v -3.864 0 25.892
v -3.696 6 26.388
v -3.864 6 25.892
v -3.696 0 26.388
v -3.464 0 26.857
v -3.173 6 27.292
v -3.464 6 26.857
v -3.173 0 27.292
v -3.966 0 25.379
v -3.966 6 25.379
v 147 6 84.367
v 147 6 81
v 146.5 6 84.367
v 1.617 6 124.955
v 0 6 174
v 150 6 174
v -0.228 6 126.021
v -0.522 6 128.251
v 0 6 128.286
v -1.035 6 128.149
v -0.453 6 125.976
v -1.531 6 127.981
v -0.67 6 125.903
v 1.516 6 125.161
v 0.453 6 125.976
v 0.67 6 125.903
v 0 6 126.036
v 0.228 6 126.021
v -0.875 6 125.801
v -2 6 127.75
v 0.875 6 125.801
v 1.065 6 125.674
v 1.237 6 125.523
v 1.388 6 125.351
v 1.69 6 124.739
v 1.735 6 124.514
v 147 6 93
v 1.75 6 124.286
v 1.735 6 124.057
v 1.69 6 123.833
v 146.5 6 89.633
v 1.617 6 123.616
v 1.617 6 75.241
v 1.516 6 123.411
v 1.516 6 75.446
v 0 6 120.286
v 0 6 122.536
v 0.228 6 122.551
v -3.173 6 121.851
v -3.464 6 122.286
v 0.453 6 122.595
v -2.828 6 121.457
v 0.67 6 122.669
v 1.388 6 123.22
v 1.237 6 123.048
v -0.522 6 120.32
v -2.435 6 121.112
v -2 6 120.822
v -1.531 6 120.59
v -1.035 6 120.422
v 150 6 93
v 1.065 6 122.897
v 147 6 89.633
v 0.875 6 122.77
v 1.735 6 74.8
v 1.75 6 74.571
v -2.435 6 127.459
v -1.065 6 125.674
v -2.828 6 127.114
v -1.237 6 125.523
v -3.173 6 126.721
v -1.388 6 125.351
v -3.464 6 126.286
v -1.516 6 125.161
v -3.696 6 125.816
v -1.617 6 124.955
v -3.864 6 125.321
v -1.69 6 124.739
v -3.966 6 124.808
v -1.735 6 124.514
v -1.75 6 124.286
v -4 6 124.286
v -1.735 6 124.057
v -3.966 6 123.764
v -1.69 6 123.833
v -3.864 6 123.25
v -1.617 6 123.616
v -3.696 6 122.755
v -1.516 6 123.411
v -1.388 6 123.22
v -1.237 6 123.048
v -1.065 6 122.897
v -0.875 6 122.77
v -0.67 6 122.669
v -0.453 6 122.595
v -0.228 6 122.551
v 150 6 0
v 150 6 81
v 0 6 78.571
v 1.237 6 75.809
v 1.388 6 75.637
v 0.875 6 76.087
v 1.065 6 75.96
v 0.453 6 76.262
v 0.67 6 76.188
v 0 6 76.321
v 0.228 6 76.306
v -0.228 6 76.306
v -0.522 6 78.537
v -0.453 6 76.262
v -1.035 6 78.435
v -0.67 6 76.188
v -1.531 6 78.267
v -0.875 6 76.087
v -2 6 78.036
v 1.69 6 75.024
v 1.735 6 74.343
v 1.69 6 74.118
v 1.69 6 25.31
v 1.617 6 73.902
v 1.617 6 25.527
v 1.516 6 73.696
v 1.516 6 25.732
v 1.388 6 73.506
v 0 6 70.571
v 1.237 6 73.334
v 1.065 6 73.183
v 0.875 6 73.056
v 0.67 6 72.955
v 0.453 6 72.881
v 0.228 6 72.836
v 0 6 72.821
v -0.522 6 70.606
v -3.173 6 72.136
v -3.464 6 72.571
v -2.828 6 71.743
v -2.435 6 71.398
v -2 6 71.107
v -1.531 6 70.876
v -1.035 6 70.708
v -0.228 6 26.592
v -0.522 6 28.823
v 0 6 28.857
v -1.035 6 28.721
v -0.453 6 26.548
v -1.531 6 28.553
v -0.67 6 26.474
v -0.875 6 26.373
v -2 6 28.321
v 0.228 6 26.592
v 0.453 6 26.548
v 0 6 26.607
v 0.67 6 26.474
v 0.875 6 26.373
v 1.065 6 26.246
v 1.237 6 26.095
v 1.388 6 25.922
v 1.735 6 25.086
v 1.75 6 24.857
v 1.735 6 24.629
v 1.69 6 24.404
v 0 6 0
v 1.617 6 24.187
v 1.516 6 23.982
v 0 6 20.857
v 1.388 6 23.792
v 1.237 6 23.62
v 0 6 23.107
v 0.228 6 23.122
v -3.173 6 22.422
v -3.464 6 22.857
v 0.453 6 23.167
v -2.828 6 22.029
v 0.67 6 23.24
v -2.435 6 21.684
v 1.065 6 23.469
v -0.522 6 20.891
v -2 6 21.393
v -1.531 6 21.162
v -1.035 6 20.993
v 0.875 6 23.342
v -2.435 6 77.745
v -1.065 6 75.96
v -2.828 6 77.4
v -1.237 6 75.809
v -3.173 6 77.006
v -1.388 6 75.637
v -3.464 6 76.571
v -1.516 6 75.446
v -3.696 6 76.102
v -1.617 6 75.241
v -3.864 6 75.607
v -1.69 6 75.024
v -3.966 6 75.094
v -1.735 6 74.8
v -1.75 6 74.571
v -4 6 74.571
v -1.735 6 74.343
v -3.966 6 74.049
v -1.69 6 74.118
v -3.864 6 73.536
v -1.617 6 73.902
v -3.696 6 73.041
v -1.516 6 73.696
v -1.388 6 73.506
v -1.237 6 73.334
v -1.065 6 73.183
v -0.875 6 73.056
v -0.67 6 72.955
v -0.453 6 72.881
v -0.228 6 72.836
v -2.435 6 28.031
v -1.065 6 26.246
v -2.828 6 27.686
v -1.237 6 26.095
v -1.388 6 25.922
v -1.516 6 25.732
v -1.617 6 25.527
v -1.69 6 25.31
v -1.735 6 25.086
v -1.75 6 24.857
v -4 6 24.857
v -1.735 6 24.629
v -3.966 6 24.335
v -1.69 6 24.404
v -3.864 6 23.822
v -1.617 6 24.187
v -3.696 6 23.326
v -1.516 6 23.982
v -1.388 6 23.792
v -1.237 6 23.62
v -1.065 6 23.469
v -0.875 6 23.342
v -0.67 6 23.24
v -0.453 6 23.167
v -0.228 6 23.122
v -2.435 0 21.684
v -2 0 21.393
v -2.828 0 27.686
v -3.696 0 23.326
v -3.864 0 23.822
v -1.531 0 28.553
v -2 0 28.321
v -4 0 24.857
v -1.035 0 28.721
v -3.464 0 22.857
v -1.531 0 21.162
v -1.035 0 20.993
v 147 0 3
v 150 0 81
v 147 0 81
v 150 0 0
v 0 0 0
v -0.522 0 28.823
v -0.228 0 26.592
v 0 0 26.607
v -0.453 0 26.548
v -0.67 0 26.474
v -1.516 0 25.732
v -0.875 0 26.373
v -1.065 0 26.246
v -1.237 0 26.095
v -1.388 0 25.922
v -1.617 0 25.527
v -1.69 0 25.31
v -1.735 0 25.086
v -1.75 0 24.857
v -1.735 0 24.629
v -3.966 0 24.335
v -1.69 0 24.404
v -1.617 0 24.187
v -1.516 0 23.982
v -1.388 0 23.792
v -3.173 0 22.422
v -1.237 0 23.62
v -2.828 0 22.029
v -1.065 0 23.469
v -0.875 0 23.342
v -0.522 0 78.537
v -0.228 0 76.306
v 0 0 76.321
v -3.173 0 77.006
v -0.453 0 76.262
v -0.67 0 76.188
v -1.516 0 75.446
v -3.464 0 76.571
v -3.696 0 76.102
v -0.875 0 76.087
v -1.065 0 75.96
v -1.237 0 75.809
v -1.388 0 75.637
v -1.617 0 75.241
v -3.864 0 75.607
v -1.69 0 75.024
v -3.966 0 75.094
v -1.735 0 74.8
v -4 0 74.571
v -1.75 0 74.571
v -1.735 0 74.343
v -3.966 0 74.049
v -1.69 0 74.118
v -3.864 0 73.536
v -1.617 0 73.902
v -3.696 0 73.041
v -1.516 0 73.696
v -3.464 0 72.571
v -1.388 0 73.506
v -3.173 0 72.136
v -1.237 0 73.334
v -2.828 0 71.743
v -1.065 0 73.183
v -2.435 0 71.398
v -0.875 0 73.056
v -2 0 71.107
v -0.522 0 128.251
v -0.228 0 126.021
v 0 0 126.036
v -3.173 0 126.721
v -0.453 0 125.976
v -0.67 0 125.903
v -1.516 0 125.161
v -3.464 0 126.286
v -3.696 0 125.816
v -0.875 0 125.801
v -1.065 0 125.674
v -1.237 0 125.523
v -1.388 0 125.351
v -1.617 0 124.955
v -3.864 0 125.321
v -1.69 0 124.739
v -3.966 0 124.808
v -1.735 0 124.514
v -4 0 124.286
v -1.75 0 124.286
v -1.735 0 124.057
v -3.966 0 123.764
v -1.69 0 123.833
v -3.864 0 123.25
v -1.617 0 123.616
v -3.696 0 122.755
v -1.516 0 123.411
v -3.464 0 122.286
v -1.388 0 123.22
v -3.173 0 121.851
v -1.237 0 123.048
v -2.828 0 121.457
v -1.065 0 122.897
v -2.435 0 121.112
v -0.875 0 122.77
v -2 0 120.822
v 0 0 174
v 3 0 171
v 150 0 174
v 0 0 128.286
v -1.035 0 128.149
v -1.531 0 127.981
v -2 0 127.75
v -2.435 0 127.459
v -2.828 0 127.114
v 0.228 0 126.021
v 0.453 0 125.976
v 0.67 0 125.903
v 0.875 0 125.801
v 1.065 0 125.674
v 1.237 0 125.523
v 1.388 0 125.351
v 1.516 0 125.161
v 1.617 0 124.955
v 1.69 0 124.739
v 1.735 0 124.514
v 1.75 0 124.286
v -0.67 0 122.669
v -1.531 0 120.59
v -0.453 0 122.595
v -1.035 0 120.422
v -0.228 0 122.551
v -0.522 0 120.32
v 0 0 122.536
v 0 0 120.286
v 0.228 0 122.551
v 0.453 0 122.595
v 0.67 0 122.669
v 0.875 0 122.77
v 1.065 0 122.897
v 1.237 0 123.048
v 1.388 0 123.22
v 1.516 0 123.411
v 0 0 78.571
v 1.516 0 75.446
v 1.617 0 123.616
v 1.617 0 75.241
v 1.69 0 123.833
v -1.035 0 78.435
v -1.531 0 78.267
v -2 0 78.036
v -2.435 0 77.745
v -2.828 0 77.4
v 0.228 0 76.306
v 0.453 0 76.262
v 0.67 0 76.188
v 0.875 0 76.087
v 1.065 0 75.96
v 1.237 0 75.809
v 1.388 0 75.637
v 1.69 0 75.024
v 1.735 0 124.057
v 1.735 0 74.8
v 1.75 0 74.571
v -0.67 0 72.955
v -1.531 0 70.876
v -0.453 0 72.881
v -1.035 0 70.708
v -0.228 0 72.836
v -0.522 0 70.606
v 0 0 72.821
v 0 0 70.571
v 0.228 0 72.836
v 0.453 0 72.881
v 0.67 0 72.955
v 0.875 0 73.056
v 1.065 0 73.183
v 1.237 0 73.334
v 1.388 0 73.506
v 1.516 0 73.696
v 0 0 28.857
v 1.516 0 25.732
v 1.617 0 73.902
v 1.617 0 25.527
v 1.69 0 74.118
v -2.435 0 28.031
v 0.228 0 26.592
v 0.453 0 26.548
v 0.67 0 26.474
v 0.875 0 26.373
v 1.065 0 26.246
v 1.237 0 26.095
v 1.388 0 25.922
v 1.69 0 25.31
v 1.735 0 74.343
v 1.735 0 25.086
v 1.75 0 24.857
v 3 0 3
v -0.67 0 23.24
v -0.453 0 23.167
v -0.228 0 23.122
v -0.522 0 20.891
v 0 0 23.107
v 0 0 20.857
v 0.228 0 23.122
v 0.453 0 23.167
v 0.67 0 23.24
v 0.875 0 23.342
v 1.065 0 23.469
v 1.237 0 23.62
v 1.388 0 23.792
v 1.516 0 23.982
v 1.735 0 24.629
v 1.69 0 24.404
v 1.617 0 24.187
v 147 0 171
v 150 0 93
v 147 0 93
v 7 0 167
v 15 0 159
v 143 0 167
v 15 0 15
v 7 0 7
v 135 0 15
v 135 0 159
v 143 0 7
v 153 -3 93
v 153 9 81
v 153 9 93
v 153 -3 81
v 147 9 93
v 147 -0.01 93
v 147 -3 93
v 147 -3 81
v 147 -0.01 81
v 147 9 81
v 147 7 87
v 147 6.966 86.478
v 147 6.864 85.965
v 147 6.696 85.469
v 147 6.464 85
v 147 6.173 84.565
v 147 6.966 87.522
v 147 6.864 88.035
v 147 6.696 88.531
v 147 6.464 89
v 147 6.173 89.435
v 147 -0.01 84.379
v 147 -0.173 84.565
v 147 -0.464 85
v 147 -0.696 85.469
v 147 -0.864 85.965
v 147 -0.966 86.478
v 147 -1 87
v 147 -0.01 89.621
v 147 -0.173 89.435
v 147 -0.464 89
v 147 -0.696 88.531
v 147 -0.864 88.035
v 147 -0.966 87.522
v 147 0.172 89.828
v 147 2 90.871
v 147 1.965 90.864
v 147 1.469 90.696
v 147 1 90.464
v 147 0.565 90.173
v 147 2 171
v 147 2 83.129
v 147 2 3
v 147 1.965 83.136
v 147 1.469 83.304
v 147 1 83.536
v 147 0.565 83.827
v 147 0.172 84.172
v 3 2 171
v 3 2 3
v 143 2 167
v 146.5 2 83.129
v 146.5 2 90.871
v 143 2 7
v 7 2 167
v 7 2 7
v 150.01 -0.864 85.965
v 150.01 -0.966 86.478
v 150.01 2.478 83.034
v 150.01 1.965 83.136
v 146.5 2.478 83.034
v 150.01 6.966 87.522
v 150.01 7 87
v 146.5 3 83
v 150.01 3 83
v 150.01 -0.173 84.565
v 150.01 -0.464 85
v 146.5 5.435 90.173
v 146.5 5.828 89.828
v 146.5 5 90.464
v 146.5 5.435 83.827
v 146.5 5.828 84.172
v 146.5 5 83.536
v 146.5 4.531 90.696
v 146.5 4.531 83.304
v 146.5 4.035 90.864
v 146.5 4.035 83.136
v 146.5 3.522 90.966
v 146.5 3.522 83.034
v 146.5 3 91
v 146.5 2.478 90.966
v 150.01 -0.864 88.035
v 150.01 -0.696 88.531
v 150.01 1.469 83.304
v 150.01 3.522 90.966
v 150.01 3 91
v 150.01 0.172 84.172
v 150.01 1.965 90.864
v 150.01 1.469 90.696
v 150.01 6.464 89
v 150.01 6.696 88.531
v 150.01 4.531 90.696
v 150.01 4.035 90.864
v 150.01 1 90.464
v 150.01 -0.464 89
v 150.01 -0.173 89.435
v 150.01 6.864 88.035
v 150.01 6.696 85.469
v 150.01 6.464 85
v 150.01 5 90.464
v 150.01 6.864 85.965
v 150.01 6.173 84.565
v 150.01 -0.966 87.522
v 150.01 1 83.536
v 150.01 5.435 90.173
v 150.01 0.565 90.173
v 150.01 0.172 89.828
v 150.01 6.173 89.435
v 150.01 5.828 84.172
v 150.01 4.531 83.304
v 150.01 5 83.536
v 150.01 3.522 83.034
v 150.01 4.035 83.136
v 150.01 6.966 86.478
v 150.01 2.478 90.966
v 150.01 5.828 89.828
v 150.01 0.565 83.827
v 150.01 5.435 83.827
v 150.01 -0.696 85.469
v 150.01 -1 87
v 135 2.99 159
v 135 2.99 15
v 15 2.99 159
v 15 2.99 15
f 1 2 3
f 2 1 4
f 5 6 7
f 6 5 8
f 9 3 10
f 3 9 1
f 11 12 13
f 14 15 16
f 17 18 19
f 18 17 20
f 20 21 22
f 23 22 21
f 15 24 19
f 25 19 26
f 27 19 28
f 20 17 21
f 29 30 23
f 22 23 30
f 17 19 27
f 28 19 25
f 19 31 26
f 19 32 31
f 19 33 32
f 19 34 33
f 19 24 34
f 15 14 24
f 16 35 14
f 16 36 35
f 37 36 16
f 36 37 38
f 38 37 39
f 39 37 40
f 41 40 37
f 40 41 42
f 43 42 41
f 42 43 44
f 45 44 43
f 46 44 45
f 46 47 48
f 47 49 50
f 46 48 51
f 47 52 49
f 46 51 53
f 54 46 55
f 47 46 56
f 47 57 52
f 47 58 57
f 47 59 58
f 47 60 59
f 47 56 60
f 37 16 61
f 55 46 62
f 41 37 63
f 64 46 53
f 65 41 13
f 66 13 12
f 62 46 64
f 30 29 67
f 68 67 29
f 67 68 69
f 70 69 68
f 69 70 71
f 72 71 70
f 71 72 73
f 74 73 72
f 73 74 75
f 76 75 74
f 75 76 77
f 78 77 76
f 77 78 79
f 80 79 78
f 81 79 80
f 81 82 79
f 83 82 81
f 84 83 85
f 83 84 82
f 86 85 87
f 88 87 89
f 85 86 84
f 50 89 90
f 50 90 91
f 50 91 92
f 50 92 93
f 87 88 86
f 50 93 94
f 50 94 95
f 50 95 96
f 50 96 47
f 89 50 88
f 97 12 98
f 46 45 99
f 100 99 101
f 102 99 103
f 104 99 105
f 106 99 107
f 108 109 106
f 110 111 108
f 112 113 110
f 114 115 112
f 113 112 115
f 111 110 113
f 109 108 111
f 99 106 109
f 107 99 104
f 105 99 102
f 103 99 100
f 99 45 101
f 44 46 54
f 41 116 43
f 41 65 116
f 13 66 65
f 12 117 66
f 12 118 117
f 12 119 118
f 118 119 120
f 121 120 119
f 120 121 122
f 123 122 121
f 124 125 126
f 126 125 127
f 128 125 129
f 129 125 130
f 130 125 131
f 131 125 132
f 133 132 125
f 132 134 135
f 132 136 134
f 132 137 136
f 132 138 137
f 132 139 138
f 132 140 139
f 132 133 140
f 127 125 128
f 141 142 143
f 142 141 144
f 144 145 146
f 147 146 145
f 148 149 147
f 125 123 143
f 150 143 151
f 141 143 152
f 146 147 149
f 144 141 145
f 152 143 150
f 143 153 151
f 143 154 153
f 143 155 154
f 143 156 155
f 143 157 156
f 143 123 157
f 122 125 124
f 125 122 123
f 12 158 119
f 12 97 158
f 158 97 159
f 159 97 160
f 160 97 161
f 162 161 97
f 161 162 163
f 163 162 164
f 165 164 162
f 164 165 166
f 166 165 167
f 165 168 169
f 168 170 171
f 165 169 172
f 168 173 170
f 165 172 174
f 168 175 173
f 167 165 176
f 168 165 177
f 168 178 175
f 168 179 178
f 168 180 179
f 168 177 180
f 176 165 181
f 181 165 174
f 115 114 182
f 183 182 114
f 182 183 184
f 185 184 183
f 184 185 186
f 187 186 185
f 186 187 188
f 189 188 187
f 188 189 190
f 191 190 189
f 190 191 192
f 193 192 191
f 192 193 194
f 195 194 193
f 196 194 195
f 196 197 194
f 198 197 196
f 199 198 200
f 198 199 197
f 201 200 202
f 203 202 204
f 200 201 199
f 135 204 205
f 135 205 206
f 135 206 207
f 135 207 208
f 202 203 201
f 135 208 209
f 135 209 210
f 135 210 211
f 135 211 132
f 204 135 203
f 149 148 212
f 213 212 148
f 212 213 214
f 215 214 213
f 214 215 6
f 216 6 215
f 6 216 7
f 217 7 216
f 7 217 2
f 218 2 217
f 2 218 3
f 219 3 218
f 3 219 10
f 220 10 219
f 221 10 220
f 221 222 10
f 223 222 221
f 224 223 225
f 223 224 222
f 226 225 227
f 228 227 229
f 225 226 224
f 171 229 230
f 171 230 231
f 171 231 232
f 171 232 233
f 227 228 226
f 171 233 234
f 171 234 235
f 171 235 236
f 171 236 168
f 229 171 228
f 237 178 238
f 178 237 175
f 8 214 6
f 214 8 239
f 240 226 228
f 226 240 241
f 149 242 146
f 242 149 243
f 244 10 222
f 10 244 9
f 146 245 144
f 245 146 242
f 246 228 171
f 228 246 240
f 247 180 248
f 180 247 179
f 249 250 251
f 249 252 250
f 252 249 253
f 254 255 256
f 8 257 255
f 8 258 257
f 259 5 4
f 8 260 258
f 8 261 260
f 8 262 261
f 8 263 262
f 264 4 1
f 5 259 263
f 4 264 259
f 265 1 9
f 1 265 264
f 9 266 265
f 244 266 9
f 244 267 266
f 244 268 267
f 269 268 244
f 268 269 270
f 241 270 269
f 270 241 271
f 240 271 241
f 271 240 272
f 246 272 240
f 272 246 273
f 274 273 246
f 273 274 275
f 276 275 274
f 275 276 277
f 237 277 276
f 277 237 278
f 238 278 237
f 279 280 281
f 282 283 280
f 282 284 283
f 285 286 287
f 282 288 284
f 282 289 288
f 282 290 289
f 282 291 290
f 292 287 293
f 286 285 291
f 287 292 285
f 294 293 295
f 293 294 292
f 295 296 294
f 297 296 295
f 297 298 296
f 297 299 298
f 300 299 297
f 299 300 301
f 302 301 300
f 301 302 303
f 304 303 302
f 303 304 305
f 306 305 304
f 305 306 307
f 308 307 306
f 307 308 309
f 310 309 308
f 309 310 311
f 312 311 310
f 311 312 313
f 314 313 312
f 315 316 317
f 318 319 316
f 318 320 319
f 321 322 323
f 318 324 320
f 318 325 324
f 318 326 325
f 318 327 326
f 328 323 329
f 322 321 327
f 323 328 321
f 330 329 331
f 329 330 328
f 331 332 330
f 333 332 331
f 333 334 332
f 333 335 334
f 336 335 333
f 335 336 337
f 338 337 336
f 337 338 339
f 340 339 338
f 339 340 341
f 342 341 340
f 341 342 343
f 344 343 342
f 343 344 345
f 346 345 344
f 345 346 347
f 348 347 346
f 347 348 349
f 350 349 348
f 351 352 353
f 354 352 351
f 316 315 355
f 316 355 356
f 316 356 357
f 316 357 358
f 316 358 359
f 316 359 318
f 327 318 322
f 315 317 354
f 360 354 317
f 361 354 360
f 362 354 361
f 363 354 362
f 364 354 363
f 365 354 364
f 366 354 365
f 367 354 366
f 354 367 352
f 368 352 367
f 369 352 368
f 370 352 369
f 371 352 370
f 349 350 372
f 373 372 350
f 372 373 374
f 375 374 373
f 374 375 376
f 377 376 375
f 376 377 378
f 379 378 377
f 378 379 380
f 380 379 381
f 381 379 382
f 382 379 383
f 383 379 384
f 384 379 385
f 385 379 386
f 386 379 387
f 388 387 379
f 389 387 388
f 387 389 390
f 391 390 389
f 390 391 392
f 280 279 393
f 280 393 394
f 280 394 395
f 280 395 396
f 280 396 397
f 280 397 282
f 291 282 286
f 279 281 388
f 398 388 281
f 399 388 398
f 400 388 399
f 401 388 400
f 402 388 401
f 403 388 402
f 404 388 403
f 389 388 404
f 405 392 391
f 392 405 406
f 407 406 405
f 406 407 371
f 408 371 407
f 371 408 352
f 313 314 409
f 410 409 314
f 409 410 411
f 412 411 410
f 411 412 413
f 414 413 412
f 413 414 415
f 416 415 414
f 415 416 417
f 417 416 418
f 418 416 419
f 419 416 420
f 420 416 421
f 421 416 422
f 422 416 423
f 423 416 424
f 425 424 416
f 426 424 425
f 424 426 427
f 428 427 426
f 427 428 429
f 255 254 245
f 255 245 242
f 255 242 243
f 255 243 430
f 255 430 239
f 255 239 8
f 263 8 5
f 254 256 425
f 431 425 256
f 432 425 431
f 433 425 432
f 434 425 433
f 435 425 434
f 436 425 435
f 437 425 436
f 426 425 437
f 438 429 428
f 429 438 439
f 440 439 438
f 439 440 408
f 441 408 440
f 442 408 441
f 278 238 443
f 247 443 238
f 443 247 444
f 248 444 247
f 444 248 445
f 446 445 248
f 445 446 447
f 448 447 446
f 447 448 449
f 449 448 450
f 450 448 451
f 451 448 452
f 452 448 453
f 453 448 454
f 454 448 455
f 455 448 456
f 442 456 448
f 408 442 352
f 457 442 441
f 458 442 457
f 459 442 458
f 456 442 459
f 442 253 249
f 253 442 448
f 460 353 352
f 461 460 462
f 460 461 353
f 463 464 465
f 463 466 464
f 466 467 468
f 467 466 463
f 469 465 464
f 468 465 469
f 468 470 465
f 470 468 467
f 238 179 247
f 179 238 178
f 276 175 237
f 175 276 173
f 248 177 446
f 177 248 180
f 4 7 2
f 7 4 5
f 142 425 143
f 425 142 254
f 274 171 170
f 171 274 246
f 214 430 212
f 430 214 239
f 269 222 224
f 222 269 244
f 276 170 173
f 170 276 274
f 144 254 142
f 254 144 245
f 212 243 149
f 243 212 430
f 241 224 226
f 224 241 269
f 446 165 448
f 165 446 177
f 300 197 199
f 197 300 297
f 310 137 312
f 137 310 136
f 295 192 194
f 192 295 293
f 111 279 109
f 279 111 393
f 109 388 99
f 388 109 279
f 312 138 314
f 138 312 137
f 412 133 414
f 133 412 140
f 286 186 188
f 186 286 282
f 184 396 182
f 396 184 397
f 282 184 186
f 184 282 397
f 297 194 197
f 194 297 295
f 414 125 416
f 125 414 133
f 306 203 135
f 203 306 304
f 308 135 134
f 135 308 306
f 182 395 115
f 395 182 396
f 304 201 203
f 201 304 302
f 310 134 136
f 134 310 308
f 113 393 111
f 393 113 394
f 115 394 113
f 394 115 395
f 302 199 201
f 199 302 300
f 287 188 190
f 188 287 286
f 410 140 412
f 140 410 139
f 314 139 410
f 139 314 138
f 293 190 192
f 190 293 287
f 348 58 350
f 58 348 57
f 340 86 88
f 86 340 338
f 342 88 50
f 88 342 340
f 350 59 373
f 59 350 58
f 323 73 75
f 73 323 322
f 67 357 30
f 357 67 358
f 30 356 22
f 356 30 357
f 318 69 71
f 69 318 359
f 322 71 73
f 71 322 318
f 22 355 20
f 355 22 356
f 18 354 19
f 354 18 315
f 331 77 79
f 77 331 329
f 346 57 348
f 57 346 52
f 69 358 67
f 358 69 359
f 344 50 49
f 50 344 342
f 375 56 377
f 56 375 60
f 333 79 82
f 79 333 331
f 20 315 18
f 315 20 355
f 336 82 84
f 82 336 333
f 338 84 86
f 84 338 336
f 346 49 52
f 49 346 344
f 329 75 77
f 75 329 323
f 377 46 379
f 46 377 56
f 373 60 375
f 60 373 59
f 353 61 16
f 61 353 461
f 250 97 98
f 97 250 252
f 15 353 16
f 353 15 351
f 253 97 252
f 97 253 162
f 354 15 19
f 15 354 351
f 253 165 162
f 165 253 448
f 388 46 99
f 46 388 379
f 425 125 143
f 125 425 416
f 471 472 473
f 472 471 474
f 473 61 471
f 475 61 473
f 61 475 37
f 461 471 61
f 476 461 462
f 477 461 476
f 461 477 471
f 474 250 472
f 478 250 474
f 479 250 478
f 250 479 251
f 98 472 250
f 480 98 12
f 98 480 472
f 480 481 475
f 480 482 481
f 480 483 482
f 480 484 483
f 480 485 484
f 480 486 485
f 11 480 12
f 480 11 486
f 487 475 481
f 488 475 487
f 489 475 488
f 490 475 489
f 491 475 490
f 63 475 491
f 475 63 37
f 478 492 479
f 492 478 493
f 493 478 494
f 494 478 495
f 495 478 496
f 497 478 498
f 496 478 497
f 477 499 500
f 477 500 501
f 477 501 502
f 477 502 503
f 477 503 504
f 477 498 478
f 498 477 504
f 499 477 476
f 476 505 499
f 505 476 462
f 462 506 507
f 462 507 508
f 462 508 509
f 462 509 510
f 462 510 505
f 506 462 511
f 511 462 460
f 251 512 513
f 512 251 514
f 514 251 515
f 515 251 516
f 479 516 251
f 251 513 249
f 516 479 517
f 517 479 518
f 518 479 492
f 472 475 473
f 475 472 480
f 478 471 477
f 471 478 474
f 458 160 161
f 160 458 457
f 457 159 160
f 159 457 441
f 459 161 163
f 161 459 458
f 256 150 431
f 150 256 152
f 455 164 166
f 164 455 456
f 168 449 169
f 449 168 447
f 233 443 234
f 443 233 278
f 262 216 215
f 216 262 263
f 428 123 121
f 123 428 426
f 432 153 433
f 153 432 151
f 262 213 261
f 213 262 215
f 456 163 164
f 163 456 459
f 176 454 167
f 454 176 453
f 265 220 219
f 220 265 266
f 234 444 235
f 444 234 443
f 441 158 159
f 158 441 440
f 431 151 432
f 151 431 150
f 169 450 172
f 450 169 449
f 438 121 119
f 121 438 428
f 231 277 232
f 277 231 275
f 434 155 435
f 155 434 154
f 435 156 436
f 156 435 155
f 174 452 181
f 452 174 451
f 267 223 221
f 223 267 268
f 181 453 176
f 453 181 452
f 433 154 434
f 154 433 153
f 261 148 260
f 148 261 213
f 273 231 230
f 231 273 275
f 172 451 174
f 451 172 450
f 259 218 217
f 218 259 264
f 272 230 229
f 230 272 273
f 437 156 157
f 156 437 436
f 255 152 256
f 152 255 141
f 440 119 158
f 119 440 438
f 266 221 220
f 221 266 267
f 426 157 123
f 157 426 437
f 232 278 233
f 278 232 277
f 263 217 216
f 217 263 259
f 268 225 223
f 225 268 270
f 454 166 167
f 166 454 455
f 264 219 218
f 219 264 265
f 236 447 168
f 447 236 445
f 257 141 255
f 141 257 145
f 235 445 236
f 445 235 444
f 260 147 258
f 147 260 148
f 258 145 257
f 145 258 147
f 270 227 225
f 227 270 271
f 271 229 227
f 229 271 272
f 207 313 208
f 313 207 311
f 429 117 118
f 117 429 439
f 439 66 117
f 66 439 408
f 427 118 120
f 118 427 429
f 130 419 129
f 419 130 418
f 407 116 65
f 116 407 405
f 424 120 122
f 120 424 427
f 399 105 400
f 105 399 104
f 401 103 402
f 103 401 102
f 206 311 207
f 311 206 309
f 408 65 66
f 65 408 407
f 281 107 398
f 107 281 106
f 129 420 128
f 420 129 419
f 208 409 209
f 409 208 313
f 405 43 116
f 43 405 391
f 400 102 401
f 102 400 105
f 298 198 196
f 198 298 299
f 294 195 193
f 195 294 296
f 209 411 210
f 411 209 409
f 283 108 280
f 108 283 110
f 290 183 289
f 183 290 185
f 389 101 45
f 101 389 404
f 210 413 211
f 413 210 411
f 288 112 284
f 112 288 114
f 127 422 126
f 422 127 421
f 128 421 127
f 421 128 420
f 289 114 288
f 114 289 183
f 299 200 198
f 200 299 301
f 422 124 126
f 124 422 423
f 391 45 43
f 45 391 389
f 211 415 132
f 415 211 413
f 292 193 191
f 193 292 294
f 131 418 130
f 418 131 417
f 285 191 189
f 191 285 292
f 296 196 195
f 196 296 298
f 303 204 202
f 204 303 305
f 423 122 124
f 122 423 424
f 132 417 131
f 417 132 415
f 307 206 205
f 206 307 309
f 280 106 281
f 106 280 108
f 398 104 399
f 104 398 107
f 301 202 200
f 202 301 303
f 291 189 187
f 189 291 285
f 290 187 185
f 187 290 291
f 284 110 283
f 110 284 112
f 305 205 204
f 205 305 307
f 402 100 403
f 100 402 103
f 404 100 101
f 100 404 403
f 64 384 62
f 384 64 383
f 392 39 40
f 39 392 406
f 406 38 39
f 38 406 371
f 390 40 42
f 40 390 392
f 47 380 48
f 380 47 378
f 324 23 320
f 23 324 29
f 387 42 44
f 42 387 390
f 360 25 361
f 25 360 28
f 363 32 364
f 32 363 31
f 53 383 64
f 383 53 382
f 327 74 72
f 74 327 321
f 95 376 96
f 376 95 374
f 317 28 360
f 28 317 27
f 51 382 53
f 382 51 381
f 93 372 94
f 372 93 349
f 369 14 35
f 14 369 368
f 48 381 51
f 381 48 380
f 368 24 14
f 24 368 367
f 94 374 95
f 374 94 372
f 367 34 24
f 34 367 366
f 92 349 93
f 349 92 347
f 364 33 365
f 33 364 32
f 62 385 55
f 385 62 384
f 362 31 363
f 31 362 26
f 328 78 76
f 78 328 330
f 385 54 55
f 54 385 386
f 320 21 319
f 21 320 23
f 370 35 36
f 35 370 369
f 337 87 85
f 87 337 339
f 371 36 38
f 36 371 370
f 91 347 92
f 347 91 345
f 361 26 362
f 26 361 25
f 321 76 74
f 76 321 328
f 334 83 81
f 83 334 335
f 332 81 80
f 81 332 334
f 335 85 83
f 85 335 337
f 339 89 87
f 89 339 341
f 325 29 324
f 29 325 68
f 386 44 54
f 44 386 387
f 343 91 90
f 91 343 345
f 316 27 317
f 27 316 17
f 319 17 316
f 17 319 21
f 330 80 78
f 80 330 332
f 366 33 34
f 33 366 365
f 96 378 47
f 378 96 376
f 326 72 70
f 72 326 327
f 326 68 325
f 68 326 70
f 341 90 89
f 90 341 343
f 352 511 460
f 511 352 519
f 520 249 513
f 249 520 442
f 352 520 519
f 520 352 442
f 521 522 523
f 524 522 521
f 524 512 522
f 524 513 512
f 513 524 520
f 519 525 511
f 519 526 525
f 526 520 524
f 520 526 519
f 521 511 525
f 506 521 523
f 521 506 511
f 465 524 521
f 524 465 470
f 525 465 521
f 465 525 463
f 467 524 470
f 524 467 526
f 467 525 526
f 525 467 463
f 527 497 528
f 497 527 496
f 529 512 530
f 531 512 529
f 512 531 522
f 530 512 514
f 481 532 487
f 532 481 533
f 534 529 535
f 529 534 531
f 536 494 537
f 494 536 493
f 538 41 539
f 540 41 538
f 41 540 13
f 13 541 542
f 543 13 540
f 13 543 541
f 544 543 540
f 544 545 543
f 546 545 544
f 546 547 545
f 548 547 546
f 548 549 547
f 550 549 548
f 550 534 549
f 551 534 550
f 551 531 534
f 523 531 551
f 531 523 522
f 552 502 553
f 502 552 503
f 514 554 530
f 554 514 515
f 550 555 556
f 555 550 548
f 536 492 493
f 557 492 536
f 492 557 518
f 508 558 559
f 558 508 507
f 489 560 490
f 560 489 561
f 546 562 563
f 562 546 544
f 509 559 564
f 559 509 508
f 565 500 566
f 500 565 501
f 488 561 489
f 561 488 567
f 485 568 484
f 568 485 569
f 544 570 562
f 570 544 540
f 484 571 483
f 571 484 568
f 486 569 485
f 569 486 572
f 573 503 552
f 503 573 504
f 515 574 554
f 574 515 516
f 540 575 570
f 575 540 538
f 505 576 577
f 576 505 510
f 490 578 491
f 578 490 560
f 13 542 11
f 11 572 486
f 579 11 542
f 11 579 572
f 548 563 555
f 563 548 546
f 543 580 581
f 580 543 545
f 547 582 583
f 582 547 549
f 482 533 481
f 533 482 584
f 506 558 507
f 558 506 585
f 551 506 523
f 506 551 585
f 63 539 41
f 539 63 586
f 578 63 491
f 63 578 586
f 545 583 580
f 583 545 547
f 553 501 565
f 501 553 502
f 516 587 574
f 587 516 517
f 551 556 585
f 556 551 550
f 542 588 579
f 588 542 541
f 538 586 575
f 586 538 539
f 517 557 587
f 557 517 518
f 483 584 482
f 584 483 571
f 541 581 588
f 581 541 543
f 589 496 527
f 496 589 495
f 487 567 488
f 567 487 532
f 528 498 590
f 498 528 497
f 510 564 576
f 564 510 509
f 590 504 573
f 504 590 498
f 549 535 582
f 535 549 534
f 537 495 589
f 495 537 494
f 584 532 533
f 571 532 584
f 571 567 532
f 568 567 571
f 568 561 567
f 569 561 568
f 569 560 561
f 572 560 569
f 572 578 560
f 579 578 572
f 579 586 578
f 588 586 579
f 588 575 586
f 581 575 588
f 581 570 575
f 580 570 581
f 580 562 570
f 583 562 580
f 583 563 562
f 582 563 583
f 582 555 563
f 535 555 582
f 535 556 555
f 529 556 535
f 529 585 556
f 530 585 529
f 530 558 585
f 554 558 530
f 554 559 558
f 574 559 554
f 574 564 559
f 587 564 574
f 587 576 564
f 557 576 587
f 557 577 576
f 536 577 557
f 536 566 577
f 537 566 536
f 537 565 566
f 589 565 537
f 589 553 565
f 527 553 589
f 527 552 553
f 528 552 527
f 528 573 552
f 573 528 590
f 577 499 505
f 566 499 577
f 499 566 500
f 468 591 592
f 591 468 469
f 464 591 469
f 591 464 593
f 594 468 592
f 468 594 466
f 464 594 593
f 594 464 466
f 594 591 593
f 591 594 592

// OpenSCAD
// ============================================================
// Tray Door  (tray_door.stl)
// ============================================================
// Hinged front panel for each tray ring level.
// Width: 150mm (door_w)
// Height: ring_h - 2*flange_h = 190 - 2*8 = 174mm
// Thickness: 6mm (enc_wall + 2 for rigidity)
//
// Features:
//   - 3× hinge knuckles on left edge (mate with ring hinge bosses)
//   - Magnet pocket on right edge (mate with ring magnet pocket)
//   - Foam weather-strip groove around perimeter (4×2mm groove)
//   - Slight inward bow geometry prevents light leakage at seal
//
// Print orientation: flat (door face down on bed).
//   Footprint: 150×174mm.  Fits on 200×200mm bed.
//
// Material: PETG, 20% infill (door is lightly loaded).
// ============================================================

include <params.scad>

pw = door_panel_w;   // = 150mm
ph = door_panel_h;   // = ring_h - 2*flange_h = 174mm
pt = door_panel_t;   // = 6mm

module tray_door() {
    difference() {
        union() {

            // --- Door panel body ---
            cube([pw, pt, ph]);

            // --- Hinge knuckles (left edge, 3 evenly spaced) ---
            knuckle_h    = ph / (hinge_count * 2 + 1);  // knuckle height
            knuckle_gap  = knuckle_h;                    // gap between knuckles
            knuckle_od   = hinge_boss;                   // = 8mm
            for (i = [0:hinge_count-1]) {
                z_pos = knuckle_gap + i*(knuckle_h + knuckle_gap);
                translate([0, pt/2, z_pos])
                    rotate([90, 0, 0])
                        cylinder(d=knuckle_od, h=pt, center=true);
            }

            // --- Magnet retainer boss (right edge, centre height) ---
            translate([pw, pt/2, ph/2])
                cube([6, 12, 12], center=true);

        } // end union

        // --- Hinge pin holes (through each knuckle) ---
        knuckle_h   = ph / (hinge_count * 2 + 1);
        knuckle_gap = knuckle_h;
        for (i = [0:hinge_count-1]) {
            z_pos = knuckle_gap + i*(knuckle_h + knuckle_gap);
            translate([0, 0, z_pos])
                rotate([-90, 0, 0])
                    cylinder(d=hinge_d, h=pt + 2*eps);
        }

        // --- Magnet pocket (right edge, centre height) ---
        translate([pw + eps, pt/2, ph/2])
            rotate([0, -90, 0])
                cylinder(d=magnet_d, h=magnet_dep + eps);

        // --- Foam weather-strip groove (front face perimeter) ---
        // 4mm wide × 2mm deep groove, 3mm from panel edge
        groove_offset = 3.0;
        translate([groove_offset, -eps, groove_offset])
            difference() {
                cube([pw - 2*groove_offset,
                      foam_groove_d + eps,
                      ph - 2*groove_offset]);
                translate([foam_groove_w, 0, foam_groove_w])
                    cube([pw - 2*groove_offset - 2*foam_groove_w,
                          foam_groove_d + 2*eps,
                          ph - 2*groove_offset - 2*foam_groove_w]);
            }

        // --- Lightening cutout (centre, reduces material ~20%) ---
        cutout_inset = 15.0;
        translate([cutout_inset, -eps, cutout_inset])
            cube([pw - 2*cutout_inset,
                  pt/2,
                  ph - 2*cutout_inset]);

    } // end difference
}

tray_door();
